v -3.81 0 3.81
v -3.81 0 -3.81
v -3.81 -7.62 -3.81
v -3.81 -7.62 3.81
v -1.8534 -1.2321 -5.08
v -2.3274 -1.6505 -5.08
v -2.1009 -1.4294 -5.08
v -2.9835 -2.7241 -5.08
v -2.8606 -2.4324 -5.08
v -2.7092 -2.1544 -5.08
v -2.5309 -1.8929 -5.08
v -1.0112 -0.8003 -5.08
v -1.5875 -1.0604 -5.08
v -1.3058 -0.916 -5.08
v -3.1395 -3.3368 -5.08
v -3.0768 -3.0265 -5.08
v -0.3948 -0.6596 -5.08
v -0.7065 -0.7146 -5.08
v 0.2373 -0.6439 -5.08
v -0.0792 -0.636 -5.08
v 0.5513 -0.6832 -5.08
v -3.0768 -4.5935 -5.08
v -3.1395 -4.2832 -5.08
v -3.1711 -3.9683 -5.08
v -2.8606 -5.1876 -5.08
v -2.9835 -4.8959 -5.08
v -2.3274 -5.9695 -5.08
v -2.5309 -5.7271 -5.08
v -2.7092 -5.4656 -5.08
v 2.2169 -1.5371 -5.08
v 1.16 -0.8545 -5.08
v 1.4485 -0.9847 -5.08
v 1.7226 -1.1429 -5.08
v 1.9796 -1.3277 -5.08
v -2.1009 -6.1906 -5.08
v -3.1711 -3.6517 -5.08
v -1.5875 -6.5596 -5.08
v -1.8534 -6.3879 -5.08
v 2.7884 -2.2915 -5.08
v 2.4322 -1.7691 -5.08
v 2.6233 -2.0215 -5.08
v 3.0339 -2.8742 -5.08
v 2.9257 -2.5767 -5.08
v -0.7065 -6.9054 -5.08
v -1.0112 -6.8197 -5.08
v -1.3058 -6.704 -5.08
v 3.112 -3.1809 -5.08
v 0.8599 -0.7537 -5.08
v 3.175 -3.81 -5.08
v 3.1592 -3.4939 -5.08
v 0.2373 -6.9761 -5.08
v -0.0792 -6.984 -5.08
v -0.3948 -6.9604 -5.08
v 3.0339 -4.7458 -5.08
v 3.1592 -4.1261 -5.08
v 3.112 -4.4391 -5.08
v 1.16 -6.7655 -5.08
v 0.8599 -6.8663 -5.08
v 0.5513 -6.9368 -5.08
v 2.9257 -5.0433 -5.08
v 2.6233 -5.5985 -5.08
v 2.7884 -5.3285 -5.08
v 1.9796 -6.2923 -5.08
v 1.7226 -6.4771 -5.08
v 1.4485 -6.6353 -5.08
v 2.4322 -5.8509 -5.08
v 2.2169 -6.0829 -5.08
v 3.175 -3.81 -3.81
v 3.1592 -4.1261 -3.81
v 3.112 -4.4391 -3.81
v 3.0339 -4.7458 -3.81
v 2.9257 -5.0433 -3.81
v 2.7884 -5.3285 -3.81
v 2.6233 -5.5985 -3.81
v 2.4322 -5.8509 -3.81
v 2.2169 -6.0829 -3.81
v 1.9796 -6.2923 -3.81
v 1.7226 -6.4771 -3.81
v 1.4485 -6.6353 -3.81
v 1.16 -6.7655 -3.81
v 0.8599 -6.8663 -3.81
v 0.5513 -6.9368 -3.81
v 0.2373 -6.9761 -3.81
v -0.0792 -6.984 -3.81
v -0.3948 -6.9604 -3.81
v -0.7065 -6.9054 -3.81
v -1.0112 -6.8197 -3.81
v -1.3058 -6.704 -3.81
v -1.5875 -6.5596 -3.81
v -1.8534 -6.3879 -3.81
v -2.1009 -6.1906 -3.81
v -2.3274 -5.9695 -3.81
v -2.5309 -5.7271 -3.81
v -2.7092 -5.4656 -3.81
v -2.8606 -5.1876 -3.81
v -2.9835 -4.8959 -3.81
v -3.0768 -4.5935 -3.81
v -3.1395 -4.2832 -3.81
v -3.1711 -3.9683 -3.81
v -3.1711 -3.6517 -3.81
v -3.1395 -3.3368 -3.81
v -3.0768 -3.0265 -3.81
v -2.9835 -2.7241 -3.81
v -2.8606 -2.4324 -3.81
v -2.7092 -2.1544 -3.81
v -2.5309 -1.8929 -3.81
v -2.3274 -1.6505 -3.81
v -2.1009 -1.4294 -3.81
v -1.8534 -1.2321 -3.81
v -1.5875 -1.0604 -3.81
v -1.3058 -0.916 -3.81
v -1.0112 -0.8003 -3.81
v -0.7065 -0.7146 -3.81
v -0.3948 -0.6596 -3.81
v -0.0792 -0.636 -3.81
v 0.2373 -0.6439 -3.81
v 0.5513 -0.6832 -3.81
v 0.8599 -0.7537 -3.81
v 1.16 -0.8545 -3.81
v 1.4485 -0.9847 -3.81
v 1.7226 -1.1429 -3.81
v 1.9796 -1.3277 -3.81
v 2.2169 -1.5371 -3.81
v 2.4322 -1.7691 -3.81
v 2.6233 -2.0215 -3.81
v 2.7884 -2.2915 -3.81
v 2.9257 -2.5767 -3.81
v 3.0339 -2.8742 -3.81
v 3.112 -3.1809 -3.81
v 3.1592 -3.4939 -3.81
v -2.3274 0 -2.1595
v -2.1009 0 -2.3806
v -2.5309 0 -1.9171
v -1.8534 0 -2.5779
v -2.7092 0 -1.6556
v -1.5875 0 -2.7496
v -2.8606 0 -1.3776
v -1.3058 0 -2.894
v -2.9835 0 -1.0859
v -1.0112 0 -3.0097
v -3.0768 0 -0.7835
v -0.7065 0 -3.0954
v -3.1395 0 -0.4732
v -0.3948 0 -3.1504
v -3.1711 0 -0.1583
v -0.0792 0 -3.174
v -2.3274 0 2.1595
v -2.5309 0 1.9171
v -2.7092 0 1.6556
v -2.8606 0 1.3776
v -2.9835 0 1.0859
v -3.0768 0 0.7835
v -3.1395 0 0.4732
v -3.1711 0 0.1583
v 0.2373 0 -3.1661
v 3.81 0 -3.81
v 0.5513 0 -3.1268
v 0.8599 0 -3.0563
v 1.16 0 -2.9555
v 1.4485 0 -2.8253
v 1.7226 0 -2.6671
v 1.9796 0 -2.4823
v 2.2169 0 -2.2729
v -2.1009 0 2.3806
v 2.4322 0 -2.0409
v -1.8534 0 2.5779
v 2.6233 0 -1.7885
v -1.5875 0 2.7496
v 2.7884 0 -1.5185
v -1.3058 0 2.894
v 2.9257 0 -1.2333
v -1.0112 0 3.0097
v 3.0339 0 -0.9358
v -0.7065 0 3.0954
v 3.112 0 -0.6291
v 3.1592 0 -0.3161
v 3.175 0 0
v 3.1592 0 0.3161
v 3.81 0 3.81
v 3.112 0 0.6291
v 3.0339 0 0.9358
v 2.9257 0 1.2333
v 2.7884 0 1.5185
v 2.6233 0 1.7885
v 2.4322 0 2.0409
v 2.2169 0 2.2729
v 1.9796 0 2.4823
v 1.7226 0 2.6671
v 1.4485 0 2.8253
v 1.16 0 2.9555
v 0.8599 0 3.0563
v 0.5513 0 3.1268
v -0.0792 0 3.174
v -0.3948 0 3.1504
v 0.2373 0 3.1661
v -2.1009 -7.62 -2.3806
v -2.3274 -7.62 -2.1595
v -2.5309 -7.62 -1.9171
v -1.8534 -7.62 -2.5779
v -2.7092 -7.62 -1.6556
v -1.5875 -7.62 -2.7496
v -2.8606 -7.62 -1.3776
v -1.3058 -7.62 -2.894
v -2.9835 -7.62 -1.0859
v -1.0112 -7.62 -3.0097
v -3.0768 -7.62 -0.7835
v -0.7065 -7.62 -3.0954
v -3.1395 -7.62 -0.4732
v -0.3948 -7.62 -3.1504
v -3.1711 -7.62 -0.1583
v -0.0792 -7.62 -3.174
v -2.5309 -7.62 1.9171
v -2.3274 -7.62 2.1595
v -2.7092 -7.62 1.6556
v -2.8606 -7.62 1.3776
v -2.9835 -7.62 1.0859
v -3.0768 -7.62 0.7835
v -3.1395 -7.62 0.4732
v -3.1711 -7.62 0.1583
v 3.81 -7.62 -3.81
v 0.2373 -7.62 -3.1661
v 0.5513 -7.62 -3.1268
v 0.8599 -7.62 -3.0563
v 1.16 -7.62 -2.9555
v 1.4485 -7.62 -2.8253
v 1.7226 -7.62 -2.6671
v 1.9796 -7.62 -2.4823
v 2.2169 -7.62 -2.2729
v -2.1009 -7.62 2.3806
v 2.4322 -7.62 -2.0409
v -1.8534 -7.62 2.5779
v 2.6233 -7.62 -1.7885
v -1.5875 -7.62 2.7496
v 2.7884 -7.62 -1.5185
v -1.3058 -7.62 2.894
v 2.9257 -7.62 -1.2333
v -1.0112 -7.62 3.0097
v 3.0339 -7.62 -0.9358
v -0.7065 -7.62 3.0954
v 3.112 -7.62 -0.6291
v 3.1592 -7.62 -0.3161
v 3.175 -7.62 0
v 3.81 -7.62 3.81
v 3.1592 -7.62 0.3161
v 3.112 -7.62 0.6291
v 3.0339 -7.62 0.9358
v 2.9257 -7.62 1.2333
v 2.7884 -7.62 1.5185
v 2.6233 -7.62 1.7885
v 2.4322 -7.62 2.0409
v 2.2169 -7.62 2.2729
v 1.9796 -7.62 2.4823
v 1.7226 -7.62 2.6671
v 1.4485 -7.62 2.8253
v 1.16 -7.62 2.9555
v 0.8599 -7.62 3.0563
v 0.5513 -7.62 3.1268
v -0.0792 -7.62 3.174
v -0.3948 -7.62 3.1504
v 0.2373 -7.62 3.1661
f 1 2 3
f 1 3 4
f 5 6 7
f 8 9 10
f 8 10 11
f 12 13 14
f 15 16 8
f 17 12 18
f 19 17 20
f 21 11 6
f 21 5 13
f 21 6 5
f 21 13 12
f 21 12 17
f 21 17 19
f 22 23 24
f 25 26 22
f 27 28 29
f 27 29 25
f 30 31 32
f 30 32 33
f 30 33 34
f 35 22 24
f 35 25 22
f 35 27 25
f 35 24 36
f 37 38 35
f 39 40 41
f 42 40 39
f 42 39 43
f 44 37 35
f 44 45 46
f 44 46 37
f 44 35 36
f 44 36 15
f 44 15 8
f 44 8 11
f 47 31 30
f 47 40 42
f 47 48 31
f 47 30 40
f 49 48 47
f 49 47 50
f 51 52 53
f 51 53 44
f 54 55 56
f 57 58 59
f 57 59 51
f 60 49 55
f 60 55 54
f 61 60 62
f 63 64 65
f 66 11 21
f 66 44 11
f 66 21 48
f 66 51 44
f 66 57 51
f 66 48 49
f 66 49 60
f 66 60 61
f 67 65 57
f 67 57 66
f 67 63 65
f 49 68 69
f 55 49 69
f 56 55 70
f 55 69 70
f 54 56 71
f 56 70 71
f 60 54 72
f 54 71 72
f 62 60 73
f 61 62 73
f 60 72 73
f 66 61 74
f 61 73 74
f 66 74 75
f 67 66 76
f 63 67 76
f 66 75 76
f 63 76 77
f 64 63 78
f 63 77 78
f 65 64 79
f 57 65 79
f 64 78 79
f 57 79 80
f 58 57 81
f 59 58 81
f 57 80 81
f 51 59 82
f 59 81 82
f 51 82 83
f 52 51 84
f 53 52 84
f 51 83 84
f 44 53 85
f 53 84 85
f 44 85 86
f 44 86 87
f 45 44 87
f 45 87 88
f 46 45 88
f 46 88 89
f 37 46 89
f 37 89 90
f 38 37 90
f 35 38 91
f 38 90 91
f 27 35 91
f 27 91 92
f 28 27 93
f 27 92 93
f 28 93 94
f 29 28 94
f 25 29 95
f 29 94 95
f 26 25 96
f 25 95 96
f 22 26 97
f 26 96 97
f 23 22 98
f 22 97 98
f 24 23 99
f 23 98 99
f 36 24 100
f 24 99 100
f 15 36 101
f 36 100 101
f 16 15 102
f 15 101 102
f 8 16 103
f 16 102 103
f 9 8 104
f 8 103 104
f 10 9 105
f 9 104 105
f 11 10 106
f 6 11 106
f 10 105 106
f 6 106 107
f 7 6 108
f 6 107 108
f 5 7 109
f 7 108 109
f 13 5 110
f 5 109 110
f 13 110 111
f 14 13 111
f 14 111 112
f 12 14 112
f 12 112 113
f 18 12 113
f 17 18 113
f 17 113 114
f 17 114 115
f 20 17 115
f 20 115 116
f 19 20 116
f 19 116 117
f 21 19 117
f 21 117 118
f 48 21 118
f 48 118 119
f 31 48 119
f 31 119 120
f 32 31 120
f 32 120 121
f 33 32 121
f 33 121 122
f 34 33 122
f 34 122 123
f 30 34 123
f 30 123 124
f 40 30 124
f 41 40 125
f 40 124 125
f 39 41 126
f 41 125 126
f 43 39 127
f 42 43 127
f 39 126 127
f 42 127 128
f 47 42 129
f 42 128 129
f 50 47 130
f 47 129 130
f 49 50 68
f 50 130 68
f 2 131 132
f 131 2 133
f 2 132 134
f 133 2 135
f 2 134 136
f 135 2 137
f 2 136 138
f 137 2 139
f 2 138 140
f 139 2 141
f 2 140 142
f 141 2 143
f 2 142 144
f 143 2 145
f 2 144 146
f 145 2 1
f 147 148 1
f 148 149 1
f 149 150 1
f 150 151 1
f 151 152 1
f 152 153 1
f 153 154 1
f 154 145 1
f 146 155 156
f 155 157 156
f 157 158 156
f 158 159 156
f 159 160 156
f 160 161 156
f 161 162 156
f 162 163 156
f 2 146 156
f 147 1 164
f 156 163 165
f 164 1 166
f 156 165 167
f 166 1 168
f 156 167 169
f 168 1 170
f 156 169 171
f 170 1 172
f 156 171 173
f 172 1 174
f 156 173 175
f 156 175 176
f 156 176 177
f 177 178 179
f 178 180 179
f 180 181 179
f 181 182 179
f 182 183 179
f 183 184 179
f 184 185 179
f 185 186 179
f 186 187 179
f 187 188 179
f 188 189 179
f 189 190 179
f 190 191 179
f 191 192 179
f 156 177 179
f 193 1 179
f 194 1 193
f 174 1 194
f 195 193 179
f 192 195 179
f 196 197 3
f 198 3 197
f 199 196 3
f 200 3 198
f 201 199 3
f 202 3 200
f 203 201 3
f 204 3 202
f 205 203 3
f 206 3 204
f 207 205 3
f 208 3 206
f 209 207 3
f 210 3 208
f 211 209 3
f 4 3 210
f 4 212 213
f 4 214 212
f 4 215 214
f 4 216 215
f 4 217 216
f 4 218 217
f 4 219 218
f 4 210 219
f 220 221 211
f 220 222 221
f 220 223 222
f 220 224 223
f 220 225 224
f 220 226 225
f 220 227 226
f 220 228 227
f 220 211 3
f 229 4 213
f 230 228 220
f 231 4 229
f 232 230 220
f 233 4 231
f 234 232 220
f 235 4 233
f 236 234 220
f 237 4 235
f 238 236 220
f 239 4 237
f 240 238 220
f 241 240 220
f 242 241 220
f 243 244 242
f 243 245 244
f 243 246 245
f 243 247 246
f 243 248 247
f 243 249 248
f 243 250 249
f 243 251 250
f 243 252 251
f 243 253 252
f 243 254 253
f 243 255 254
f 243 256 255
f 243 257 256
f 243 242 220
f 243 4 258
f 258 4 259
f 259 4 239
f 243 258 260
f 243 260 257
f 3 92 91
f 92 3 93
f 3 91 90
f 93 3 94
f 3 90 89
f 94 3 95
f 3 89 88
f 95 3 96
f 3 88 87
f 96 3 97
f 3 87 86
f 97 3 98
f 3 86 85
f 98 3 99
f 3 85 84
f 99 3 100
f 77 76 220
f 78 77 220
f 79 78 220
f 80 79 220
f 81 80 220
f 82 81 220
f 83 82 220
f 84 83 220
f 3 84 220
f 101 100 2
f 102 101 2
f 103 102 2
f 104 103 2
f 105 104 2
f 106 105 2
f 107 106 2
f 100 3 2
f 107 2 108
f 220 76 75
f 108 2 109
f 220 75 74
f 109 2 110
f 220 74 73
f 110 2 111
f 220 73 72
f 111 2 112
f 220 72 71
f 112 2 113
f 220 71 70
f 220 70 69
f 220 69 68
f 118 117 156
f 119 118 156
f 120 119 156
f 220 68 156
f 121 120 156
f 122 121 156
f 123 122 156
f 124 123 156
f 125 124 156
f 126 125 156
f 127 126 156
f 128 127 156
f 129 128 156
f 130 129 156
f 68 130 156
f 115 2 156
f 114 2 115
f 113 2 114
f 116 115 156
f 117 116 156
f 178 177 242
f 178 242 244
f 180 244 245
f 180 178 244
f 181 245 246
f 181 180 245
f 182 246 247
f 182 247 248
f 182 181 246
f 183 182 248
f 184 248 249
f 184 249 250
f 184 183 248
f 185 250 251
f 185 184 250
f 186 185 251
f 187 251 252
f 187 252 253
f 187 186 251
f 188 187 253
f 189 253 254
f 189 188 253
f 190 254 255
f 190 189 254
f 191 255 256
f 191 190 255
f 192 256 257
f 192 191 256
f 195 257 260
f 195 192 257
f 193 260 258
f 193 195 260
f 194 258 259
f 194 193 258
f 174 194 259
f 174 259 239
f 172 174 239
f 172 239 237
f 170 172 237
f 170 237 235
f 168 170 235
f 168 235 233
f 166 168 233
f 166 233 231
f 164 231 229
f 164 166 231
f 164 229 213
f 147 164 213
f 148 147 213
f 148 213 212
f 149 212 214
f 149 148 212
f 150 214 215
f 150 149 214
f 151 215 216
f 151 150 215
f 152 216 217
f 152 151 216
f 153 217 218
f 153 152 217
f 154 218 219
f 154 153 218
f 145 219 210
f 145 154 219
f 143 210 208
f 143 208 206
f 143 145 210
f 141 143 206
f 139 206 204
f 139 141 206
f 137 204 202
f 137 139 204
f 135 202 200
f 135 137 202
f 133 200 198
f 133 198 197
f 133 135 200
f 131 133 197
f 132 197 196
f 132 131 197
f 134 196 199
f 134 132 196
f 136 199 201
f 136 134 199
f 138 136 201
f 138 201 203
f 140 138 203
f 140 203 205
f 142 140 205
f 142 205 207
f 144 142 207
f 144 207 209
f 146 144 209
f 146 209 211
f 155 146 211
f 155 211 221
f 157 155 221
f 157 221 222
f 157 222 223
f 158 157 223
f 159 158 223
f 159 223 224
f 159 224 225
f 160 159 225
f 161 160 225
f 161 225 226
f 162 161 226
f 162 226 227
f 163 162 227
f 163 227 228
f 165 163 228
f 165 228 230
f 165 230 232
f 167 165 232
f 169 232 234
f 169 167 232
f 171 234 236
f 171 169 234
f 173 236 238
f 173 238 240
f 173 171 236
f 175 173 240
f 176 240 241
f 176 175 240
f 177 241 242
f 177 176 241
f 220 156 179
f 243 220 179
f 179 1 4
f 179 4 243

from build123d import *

# Parameters (mm, degrees)
F0_W     = 7.62
F0_H     = 7.62
F0_R     = 3.175
F1_DEPTH = 7.62
F2_R     = 3.175
F3_DEPTH = 1.27


with BuildPart() as f1:
    # F0 (on Front) → F1 (new body)
    with BuildSketch(Plane.XZ):
        Rectangle(F0_W, F0_H)
        Circle(F0_R, mode=Mode.SUBTRACT)
    extrude(amount=F1_DEPTH)

    # F2 (on face) → F3 (join)
    with BuildSketch(Plane(origin=(0, 0, -3.81), x_dir=(1, 0, 0), z_dir=(0, 0, -1))):
        with Locations((0, 3.81)):
            Circle(F2_R)
    extrude(amount=F3_DEPTH)


solid = f1.part
